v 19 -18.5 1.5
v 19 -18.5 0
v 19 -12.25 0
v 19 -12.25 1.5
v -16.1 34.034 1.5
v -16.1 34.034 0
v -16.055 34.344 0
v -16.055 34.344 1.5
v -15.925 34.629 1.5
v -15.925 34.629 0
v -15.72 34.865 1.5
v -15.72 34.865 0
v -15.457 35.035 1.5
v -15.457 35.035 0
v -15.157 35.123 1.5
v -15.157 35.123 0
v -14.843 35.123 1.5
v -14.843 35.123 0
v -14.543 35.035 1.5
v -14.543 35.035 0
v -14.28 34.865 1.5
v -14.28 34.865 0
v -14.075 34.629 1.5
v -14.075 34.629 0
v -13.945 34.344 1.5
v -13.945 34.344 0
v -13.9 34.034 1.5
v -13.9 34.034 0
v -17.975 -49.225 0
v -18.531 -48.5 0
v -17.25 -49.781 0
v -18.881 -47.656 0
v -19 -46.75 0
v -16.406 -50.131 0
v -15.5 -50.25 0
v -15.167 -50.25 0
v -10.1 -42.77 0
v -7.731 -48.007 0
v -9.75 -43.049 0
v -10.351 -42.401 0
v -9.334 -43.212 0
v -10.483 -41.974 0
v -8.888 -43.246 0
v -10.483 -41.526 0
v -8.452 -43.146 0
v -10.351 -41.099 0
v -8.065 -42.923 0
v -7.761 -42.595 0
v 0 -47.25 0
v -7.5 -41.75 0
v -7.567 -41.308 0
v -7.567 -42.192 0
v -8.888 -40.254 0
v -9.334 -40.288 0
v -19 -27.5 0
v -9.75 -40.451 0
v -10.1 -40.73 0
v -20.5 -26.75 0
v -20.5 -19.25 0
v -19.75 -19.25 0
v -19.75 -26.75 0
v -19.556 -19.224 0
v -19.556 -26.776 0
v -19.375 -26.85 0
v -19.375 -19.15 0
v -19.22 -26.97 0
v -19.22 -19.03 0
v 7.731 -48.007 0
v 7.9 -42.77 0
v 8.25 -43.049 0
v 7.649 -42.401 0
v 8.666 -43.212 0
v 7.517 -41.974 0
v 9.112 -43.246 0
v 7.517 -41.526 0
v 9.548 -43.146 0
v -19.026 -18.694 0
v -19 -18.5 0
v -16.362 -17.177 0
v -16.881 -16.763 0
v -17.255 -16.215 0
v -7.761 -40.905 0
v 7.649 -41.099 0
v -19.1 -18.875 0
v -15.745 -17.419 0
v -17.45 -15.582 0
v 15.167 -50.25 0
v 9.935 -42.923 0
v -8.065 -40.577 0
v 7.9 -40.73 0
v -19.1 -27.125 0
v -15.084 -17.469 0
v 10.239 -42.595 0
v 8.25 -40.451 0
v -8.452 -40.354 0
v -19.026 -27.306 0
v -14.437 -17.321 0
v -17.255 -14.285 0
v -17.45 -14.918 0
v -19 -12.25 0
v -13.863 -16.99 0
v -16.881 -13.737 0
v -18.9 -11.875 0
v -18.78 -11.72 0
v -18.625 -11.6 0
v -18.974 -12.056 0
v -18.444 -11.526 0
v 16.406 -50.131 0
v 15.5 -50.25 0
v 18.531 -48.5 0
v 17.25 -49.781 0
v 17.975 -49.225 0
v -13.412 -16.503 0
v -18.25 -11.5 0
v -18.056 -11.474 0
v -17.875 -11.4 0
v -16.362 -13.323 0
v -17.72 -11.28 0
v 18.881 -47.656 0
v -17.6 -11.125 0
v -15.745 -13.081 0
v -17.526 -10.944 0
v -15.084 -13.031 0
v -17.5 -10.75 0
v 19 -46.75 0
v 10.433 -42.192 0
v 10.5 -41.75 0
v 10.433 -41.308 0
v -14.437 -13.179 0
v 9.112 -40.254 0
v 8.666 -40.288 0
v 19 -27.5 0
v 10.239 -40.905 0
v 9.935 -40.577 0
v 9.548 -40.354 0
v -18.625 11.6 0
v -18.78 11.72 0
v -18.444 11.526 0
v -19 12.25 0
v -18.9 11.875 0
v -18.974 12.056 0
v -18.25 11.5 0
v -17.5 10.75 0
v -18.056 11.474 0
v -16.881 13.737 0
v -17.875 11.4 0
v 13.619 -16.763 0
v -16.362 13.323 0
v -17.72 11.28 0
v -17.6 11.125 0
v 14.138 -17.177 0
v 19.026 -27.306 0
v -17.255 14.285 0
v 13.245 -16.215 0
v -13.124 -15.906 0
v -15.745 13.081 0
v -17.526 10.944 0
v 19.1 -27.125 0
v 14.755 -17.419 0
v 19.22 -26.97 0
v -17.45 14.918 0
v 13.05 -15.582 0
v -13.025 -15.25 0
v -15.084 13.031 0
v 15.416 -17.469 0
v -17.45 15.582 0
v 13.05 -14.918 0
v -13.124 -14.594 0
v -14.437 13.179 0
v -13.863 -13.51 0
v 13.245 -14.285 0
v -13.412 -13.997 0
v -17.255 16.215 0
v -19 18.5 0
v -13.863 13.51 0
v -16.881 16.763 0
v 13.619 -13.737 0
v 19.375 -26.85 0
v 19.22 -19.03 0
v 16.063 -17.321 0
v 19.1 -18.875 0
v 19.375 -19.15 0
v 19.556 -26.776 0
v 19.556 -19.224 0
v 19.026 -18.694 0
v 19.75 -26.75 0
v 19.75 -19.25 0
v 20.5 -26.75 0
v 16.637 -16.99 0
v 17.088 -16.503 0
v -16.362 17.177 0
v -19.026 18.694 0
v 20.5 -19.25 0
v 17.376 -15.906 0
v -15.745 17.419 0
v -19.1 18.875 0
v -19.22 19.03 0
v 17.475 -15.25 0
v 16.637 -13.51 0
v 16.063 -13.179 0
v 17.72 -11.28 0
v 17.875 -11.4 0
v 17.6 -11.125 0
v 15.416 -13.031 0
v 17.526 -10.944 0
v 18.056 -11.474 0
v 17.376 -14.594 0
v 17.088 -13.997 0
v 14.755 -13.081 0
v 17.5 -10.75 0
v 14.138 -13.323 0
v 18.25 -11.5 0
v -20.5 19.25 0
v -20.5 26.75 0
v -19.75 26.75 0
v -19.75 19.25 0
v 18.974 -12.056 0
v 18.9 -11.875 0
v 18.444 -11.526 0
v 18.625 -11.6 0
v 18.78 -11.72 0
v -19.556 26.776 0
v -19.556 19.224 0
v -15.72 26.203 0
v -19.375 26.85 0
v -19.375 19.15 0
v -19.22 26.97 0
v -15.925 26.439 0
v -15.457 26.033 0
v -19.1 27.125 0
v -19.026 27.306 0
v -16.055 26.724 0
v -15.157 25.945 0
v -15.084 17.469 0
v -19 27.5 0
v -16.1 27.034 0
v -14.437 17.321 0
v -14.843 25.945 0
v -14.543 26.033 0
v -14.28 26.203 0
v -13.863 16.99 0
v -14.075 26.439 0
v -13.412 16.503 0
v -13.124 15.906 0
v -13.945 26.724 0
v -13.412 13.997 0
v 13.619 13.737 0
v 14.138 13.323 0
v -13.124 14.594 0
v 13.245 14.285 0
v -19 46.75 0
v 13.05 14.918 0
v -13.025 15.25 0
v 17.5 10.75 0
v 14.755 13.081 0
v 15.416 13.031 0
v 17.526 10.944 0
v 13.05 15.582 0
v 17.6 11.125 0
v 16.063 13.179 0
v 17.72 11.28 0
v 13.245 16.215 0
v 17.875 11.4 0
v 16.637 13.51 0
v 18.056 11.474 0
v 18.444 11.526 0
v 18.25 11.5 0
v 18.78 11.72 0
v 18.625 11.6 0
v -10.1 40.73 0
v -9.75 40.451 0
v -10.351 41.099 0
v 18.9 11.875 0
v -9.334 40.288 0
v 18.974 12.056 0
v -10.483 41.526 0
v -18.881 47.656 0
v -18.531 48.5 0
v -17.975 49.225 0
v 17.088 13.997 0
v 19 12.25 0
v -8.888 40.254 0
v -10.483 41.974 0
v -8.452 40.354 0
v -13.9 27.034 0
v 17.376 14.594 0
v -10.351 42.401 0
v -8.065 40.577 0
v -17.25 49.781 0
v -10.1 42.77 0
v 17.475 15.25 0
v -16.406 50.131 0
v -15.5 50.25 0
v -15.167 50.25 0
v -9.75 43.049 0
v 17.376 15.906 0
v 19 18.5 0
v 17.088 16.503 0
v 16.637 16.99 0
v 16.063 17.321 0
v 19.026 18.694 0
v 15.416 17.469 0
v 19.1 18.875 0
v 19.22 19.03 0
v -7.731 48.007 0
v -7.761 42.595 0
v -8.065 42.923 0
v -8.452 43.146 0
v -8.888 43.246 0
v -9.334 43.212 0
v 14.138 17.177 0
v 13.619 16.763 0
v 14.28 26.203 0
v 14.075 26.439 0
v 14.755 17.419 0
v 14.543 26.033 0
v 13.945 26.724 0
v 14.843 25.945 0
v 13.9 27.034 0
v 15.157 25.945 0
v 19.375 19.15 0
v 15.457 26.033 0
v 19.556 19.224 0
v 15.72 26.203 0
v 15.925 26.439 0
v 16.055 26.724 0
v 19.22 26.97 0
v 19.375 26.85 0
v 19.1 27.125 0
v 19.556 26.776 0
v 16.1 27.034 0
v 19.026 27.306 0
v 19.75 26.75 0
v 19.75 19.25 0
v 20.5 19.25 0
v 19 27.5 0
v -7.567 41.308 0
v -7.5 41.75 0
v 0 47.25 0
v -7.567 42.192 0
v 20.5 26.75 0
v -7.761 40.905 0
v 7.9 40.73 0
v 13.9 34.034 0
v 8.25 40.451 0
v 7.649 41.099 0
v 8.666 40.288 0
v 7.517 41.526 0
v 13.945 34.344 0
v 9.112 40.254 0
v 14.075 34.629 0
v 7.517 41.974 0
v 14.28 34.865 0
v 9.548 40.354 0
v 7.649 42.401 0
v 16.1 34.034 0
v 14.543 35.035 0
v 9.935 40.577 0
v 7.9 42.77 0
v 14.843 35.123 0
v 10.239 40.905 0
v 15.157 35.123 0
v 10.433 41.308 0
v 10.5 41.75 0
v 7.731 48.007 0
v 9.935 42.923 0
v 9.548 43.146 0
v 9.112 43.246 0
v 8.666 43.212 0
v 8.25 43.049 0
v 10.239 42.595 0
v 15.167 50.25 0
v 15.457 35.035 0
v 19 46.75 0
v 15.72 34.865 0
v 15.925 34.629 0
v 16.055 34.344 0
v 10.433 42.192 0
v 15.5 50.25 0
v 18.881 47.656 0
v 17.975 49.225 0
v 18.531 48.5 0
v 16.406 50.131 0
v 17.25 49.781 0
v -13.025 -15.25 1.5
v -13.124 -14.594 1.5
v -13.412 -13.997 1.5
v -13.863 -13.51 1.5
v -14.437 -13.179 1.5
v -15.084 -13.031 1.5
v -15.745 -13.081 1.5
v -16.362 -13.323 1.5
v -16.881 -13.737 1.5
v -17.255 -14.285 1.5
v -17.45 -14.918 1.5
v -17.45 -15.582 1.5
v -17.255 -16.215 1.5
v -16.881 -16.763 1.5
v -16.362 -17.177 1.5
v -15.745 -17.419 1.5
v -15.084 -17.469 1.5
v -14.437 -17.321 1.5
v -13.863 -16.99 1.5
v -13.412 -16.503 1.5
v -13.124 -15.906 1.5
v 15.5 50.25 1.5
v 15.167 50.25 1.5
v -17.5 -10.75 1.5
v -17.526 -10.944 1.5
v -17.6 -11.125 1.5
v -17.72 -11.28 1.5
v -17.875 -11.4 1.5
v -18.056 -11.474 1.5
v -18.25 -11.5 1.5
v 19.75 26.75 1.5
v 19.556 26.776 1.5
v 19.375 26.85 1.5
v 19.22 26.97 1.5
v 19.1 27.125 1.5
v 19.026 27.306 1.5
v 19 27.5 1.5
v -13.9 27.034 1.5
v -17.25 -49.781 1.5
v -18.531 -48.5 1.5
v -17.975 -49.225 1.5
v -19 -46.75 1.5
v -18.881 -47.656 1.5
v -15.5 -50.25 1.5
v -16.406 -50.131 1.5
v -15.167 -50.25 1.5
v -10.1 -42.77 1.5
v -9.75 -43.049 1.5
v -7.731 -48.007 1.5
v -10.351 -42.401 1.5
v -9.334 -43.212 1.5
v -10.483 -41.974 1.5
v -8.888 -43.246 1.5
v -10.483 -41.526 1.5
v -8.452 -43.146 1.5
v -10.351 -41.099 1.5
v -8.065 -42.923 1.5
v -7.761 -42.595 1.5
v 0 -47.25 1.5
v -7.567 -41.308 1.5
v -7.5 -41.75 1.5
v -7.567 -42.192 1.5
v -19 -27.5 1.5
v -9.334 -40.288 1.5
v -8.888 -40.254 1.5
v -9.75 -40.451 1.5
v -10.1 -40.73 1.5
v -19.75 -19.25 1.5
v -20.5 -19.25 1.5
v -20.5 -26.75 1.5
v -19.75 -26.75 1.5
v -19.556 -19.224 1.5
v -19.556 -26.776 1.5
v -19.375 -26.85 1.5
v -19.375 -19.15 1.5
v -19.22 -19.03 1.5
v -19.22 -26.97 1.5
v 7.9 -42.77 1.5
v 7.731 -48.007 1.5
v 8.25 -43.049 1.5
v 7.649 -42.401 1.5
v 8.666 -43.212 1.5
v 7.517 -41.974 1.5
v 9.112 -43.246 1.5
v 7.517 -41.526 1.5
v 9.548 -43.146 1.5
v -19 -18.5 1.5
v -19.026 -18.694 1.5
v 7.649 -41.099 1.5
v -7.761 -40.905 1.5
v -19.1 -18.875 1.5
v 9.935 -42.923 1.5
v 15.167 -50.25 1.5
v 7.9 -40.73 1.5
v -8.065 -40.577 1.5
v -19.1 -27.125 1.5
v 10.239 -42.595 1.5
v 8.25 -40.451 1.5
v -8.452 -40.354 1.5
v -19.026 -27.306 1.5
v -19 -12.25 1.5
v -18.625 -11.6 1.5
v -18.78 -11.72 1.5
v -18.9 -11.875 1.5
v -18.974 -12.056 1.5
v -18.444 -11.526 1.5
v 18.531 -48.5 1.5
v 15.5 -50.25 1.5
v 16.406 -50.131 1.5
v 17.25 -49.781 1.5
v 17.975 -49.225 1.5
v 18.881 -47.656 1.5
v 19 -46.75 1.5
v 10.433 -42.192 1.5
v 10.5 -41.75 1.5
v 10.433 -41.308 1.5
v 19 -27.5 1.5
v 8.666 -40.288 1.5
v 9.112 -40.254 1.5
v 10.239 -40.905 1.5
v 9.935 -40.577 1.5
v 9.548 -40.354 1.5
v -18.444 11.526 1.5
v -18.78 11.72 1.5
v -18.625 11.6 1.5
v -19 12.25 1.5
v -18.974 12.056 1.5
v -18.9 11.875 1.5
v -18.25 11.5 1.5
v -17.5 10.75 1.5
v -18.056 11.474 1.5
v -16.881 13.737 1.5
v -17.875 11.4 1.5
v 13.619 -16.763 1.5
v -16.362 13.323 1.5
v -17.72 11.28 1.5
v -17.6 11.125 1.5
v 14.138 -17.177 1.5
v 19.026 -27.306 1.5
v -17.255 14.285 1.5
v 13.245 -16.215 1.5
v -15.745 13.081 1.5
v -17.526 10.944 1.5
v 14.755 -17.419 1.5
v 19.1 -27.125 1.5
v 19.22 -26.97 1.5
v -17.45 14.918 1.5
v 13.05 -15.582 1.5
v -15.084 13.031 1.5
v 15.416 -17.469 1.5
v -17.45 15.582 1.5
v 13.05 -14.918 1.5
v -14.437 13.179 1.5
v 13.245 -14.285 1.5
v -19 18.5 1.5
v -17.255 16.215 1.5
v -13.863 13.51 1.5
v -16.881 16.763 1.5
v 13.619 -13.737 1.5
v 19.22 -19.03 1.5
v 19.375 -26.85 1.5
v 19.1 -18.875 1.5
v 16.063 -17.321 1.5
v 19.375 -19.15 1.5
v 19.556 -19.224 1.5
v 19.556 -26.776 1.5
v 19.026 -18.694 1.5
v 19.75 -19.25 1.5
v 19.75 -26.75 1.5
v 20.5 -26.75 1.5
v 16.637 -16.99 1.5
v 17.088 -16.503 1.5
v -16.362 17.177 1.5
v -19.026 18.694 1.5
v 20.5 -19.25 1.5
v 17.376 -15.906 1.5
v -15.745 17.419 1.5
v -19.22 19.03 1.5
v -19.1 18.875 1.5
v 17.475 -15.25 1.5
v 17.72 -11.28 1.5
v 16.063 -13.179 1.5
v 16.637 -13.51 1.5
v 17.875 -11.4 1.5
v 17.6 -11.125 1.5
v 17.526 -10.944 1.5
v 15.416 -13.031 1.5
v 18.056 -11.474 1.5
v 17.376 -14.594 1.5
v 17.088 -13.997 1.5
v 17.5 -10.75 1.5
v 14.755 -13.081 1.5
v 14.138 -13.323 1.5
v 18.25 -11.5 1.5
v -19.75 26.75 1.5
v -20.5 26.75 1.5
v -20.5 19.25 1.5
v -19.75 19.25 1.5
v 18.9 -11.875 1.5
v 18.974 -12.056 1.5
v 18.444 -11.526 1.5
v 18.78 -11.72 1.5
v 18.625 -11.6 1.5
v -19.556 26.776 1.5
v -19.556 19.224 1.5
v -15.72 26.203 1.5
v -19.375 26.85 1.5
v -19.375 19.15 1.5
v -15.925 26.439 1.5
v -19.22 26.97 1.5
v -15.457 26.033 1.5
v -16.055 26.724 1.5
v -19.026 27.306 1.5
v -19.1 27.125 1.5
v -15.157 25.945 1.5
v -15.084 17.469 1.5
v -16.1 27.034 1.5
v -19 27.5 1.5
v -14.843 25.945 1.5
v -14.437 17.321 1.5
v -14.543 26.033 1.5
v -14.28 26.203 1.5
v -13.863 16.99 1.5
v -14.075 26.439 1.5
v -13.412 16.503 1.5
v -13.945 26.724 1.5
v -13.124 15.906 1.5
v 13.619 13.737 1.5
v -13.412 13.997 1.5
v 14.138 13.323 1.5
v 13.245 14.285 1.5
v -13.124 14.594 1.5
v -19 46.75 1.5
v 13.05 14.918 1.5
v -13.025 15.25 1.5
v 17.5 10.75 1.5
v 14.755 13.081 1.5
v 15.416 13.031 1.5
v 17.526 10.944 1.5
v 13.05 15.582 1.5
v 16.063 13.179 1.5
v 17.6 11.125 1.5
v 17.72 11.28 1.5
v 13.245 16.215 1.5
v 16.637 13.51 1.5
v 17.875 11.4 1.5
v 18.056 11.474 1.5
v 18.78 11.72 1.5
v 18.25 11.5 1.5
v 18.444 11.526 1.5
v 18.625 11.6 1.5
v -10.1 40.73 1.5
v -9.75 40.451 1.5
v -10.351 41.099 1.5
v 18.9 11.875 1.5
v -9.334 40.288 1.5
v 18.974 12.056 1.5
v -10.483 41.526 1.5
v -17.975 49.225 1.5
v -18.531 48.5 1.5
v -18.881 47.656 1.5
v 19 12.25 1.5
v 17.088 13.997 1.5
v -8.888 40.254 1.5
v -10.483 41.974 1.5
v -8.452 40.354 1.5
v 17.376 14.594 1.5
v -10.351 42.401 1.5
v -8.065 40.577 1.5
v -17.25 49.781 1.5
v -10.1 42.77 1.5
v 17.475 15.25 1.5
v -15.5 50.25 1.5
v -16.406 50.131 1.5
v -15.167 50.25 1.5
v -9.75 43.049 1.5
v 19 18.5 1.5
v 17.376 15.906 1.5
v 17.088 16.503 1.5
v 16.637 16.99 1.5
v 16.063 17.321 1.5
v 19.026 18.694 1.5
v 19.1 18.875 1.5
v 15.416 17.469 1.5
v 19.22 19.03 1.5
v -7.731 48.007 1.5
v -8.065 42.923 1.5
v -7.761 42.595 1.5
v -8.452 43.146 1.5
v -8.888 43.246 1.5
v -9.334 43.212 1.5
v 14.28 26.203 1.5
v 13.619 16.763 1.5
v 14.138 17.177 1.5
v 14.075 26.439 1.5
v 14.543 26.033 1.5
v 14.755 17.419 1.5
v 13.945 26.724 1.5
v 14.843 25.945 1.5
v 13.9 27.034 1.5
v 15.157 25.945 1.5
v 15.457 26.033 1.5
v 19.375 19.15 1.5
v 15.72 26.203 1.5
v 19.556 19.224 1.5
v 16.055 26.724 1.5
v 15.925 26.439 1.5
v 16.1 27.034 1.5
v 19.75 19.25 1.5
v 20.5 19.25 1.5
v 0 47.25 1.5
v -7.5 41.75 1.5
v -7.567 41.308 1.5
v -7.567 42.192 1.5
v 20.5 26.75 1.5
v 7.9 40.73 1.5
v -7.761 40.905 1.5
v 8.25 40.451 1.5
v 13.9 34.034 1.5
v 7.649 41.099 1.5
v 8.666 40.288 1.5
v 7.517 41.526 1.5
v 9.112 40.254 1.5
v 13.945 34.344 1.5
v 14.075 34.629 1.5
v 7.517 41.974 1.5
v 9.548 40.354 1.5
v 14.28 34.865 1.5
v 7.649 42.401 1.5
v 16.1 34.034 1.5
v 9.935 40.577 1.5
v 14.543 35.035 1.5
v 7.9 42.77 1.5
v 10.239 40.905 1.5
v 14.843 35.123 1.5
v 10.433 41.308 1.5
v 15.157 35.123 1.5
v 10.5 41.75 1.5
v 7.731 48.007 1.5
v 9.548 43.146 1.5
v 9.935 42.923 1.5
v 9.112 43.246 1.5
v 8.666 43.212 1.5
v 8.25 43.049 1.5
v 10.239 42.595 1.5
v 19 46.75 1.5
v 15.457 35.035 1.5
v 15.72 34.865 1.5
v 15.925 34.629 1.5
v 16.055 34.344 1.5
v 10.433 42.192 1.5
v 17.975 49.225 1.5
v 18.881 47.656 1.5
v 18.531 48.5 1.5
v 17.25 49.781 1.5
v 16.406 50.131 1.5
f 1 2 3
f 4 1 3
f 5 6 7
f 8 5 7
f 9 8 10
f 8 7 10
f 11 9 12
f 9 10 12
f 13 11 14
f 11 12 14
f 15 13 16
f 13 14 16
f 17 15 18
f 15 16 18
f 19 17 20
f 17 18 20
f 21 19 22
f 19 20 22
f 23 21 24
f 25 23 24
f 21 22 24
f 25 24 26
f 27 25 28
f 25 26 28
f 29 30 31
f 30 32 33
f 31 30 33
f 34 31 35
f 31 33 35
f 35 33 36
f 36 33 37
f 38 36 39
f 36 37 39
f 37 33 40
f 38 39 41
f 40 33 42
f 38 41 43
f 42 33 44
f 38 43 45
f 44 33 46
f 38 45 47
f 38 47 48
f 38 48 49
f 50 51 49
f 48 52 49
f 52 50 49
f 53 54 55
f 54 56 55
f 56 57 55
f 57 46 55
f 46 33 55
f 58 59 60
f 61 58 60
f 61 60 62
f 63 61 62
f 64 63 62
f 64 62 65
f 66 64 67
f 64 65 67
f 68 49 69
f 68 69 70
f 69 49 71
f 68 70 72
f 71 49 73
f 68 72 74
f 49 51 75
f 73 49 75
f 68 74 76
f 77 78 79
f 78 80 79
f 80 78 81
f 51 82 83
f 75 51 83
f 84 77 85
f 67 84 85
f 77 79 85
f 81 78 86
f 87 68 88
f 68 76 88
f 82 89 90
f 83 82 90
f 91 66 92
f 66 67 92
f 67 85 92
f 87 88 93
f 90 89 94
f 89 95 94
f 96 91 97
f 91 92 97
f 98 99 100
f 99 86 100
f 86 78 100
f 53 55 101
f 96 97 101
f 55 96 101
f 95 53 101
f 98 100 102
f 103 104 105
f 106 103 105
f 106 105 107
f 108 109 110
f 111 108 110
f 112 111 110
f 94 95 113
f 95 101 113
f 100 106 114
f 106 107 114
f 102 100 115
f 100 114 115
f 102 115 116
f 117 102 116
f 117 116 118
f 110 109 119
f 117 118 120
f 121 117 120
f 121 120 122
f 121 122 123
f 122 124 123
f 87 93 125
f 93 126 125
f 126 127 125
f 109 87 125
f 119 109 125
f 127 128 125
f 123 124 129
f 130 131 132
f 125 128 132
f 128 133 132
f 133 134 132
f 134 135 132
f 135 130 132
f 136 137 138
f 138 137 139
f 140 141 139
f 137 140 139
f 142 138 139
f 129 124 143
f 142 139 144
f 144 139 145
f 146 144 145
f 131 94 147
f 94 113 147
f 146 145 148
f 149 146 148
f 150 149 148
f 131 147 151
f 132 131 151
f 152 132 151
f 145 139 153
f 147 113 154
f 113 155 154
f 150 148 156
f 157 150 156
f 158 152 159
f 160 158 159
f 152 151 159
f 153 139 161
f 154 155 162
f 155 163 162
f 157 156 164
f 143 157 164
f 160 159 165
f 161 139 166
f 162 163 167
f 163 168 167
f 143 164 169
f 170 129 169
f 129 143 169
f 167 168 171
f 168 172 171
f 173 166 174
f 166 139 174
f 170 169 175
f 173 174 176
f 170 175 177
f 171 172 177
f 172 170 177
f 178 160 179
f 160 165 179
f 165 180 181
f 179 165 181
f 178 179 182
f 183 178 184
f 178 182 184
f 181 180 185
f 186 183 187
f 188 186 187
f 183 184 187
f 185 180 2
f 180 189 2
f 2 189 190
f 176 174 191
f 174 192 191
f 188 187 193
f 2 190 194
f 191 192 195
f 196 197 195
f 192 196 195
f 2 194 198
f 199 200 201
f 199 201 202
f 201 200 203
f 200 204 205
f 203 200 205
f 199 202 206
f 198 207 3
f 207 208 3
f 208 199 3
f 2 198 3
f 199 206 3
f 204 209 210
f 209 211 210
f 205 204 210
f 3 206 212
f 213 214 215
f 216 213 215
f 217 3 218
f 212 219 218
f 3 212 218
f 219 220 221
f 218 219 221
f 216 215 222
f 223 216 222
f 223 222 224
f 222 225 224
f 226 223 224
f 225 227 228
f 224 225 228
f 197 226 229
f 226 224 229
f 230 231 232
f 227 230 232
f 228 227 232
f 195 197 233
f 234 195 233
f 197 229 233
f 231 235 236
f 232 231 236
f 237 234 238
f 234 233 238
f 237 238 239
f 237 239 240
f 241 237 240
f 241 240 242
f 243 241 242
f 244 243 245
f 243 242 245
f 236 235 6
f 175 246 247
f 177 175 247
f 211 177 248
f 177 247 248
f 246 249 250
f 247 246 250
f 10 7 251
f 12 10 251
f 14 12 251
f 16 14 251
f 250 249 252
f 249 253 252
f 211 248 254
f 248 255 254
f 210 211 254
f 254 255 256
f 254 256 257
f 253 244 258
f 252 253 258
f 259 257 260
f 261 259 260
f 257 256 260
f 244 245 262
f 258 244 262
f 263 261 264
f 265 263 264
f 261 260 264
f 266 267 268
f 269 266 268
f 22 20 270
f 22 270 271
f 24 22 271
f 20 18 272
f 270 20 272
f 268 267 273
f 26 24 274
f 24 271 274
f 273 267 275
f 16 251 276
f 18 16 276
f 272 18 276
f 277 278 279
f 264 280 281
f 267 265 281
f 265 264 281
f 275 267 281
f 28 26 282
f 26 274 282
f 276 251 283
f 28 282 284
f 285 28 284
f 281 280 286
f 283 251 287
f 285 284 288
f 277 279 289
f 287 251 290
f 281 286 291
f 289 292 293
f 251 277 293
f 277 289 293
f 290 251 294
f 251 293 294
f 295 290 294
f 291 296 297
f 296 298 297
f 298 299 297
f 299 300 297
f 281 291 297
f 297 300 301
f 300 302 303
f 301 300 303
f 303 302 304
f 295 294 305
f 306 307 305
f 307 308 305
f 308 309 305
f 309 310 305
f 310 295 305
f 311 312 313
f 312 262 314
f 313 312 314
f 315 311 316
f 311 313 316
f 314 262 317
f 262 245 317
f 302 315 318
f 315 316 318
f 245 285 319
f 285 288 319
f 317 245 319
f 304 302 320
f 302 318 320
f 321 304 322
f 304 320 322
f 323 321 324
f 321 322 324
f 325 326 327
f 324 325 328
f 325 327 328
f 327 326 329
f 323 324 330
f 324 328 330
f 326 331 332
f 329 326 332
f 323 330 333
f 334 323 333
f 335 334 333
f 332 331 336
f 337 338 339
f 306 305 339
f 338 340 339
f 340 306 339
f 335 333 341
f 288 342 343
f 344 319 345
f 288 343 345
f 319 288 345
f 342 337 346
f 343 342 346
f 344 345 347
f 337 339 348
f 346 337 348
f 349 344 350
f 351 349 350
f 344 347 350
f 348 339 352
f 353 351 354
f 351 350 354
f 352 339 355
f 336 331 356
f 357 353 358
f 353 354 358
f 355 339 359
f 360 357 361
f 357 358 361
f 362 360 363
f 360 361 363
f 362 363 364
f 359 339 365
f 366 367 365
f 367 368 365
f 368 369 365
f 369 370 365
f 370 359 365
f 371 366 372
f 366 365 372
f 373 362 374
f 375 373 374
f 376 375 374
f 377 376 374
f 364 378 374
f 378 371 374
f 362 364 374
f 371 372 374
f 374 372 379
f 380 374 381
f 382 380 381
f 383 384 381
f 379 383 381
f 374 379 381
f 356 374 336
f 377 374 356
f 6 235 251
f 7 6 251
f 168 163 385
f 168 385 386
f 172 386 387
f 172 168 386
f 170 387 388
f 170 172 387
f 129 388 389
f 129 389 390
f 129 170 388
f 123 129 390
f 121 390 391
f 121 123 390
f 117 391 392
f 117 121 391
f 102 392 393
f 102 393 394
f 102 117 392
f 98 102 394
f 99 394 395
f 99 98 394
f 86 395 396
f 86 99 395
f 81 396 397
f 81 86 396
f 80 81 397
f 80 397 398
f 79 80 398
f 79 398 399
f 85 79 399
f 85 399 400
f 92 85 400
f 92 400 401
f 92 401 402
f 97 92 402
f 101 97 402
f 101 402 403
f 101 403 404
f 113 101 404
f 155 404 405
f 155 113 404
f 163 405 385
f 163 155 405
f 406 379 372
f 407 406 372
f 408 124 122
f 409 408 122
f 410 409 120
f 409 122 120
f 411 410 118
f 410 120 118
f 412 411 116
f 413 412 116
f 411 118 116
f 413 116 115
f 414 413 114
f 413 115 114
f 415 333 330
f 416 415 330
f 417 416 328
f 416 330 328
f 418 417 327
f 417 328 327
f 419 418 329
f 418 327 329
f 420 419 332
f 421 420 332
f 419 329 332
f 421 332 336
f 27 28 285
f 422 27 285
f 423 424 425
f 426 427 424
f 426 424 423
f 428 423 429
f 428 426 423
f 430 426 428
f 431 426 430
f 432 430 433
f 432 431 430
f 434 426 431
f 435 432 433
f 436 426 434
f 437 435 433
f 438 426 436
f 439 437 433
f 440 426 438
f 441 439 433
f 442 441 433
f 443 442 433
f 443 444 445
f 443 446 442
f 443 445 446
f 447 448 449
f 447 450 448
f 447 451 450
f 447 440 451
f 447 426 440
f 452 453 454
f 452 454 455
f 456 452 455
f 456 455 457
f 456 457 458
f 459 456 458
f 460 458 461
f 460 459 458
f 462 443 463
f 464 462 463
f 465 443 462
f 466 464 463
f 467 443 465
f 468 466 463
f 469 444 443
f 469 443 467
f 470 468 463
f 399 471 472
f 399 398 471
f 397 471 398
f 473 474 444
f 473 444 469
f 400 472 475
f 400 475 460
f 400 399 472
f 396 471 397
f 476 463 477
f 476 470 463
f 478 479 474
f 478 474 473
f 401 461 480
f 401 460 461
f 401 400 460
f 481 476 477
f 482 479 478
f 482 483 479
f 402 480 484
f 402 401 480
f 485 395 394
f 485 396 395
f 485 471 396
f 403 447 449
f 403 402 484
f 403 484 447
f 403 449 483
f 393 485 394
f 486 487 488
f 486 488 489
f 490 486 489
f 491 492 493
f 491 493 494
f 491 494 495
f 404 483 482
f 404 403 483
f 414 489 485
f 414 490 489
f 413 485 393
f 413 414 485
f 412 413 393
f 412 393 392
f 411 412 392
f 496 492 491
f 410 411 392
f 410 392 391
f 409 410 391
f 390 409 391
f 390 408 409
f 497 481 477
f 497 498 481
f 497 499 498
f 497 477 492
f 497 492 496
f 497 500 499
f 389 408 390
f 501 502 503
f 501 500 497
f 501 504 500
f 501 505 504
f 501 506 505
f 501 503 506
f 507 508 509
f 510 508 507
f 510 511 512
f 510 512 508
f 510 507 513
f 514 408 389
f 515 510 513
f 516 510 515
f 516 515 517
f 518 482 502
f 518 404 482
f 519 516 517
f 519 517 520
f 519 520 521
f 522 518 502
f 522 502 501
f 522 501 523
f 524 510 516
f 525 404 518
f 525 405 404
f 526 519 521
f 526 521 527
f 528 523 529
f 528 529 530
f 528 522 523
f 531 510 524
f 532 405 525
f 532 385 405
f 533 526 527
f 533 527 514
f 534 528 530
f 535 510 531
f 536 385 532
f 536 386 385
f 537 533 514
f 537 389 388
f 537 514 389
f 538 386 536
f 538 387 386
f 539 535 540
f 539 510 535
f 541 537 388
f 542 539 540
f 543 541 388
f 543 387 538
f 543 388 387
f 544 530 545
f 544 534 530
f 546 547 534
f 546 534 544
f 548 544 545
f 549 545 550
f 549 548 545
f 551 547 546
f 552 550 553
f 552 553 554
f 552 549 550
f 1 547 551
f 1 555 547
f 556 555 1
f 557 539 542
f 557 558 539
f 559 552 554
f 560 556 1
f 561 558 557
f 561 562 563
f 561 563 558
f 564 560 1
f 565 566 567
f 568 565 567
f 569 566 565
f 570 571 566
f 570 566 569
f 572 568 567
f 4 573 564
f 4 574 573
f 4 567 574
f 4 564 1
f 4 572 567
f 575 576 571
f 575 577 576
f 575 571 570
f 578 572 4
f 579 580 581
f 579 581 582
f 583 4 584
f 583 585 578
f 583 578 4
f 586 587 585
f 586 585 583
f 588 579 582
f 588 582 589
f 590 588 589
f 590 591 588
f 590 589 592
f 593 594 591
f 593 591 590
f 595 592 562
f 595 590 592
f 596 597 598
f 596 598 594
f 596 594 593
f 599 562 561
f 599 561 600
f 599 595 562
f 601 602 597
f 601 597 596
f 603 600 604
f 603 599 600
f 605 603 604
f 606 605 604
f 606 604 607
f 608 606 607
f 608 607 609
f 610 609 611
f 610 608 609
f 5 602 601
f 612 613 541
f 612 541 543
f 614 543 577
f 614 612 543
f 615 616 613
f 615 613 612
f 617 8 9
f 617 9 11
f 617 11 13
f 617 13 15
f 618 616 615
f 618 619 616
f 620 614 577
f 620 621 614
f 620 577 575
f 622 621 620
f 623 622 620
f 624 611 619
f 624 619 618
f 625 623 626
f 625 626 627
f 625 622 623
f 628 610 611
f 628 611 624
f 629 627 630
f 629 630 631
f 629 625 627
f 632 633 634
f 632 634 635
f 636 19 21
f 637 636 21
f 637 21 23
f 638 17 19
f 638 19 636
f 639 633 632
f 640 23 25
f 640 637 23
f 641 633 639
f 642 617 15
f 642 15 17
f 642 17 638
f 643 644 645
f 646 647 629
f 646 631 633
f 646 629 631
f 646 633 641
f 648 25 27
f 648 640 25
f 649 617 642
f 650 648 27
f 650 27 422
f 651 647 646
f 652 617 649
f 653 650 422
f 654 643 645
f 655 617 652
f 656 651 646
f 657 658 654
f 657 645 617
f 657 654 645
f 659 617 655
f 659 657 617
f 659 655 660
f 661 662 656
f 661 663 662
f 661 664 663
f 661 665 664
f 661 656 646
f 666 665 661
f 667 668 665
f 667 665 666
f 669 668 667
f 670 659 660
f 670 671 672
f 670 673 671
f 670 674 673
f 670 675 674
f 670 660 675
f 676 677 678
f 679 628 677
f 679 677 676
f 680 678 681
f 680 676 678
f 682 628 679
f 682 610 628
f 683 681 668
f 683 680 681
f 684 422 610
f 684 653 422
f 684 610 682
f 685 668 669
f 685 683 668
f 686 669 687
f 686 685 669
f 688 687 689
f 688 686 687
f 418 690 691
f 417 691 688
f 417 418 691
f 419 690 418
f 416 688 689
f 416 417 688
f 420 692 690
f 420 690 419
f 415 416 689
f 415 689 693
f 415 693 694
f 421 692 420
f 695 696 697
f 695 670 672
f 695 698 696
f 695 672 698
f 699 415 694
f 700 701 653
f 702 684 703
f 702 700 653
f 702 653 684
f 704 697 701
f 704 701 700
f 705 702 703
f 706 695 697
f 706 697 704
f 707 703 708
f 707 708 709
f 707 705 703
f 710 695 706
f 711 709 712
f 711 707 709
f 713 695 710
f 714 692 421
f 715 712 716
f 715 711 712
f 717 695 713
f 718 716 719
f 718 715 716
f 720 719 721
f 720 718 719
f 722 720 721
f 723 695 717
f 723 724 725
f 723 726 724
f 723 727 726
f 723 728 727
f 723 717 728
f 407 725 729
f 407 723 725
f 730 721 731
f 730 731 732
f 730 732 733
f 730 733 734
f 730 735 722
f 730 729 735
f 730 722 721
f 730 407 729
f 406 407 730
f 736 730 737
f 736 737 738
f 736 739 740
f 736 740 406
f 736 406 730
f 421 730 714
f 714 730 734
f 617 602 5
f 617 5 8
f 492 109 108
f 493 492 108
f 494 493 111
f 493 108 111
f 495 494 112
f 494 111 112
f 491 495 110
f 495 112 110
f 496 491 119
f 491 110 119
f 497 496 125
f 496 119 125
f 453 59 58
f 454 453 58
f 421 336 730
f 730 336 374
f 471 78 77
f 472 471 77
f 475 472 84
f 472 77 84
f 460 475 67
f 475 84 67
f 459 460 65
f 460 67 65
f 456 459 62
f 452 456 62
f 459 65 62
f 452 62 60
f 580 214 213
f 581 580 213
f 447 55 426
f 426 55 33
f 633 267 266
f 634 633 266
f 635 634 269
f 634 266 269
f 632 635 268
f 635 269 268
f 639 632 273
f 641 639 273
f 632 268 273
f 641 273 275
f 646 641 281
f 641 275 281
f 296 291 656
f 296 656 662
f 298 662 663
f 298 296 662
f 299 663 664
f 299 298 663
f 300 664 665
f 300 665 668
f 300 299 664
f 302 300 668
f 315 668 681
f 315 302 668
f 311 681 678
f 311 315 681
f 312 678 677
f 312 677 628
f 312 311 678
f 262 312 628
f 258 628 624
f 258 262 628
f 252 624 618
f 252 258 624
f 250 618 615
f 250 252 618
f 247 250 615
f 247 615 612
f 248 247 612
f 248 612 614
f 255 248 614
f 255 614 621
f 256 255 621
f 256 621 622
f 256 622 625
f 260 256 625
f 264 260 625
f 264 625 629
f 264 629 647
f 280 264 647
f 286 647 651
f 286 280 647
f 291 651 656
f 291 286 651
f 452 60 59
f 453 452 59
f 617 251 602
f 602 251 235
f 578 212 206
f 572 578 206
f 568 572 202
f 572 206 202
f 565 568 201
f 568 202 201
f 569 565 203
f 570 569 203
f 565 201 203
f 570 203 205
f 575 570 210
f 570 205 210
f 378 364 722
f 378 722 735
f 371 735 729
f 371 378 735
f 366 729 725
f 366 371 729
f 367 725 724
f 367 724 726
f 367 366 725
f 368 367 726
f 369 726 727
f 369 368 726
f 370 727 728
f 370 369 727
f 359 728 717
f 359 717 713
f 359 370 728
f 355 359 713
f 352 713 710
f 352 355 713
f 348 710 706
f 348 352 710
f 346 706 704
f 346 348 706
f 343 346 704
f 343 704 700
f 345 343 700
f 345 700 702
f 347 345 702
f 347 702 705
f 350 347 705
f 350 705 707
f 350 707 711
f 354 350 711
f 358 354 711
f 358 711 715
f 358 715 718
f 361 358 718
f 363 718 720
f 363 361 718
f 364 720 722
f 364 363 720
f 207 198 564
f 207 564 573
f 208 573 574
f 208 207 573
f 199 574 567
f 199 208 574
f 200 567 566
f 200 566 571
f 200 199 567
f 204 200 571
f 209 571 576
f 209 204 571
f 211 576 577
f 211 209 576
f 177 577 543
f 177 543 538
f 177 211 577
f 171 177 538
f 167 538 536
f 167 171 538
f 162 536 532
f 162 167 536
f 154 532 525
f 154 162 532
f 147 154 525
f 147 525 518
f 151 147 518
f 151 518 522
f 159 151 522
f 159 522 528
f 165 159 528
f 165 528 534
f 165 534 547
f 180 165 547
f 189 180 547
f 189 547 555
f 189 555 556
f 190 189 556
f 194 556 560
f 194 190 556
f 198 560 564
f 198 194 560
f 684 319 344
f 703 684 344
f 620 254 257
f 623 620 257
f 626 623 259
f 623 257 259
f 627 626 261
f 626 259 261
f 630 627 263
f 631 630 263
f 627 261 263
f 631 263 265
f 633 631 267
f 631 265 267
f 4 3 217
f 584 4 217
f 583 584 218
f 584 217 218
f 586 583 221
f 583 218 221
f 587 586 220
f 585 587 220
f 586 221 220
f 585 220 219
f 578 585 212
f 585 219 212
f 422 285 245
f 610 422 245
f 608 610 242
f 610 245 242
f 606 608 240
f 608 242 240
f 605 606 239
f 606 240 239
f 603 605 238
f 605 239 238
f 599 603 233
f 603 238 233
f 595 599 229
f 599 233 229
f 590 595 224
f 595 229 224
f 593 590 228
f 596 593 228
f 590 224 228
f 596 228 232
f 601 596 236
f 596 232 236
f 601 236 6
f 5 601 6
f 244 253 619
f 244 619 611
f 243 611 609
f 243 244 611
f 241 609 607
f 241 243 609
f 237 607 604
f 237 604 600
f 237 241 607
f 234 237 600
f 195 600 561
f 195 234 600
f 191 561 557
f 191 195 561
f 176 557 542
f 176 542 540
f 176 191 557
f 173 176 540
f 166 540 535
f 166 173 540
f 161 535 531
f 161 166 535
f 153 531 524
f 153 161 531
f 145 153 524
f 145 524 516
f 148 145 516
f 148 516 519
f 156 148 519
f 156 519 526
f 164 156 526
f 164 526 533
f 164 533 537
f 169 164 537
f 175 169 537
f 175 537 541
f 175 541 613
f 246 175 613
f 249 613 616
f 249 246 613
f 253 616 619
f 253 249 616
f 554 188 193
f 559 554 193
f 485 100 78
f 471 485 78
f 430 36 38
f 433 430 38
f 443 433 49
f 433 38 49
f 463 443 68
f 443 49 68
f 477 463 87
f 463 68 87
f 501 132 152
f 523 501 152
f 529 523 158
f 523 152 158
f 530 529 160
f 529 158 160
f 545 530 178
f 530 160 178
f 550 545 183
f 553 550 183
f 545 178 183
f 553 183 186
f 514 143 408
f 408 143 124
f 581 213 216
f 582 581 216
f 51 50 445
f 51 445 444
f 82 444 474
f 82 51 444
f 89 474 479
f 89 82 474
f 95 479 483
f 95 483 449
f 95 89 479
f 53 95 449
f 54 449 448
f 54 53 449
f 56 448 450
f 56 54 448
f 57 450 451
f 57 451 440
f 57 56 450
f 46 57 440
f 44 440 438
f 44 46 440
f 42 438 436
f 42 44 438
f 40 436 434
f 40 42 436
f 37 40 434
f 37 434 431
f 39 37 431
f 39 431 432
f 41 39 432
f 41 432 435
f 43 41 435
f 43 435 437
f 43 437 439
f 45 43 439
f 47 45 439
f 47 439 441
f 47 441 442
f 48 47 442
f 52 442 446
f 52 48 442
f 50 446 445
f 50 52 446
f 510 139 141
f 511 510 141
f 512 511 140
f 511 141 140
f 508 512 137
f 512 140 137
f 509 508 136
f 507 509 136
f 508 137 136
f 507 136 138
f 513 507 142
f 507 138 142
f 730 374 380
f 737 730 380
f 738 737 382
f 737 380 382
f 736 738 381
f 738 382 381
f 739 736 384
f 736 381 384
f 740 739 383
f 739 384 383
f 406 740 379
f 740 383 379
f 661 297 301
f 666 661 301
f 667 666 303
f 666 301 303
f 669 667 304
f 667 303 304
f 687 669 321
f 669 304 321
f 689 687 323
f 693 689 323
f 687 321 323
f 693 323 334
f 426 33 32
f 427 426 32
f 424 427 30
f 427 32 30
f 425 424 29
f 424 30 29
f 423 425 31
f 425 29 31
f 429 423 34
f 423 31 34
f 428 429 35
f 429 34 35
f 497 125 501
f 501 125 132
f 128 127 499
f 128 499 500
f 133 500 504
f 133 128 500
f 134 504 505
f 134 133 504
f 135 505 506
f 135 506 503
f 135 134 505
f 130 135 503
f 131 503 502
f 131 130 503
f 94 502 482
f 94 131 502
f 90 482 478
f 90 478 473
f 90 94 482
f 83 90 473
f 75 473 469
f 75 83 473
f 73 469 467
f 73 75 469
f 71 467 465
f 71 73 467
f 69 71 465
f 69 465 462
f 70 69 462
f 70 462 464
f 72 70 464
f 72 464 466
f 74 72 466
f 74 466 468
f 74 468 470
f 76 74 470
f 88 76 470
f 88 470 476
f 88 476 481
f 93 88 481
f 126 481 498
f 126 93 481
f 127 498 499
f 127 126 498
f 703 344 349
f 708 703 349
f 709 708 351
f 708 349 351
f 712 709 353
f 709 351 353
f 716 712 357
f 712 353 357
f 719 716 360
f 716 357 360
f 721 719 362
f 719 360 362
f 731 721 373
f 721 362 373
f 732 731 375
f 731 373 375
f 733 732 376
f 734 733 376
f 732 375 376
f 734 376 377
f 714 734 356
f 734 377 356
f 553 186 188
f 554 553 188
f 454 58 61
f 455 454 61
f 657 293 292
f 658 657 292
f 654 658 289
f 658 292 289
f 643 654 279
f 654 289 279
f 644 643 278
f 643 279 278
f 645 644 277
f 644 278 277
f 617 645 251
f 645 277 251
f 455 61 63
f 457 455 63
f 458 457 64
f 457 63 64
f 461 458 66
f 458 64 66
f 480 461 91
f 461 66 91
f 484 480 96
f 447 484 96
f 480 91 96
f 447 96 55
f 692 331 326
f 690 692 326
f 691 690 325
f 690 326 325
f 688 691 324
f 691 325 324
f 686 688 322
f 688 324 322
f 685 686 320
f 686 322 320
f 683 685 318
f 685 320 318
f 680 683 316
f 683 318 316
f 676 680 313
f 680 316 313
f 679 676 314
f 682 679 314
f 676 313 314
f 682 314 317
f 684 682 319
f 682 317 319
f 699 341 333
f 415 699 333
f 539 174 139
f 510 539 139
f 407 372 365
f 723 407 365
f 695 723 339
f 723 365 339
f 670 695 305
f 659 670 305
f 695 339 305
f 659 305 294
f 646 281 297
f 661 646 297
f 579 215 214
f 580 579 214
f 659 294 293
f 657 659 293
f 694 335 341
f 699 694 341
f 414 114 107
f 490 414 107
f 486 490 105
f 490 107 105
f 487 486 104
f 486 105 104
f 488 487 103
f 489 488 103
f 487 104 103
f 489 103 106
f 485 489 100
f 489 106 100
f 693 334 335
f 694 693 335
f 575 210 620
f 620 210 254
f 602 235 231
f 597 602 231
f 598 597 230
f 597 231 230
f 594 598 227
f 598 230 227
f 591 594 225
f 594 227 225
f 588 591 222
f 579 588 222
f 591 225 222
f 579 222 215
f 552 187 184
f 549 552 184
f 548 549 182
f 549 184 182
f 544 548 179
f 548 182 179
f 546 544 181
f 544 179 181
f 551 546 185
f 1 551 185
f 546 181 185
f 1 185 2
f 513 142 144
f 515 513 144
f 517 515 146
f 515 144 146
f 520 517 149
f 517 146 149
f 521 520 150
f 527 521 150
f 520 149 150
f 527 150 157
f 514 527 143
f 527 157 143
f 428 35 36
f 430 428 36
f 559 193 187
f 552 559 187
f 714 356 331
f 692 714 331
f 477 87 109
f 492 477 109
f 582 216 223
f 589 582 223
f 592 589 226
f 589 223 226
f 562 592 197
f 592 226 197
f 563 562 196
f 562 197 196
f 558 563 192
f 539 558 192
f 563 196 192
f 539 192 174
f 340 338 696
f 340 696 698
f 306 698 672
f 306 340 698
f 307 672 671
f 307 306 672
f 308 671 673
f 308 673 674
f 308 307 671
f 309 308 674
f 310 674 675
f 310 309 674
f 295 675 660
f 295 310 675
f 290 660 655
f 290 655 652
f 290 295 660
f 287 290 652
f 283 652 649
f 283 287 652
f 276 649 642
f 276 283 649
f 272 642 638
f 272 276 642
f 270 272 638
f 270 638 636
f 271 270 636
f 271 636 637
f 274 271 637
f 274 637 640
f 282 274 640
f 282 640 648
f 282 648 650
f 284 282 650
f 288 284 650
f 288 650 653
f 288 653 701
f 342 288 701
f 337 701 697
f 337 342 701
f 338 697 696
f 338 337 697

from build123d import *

# Parameters (mm, degrees)
F0_R     = 1.5
F0_R_2   = 2.225
F1_DEPTH = 1.5


# Not quite as in the source:
# - ends of sketch curves that miss each other by under 0.0002 mm in the source are joined


with BuildPart() as f1:
    # F0 (on Top) → F1 (new body)
    with BuildSketch(Plane.XY):
        with BuildLine():
            ThreePointArc((19.75, -19.25), (19.2196699141, -19.0303300859), (19, -18.5))
            Line((19, -18.5), (19, -12.25))
            ThreePointArc((19, -12.25), (18.7803300859, -11.7196699141), (18.25, -11.5))
            ThreePointArc((18.25, -11.5), (17.7196699141, -11.2803300859), (17.5, -10.75))
            Line((17.5, -10.75), (17.5, 10.75))
            ThreePointArc((17.5, 10.75), (17.7196699141, 11.2803300859), (18.25, 11.5))
            ThreePointArc((18.25, 11.5), (18.7803300859, 11.7196699141), (19, 12.25))
            Line((19, 12.25), (19, 18.5))
            ThreePointArc((19, 18.5), (19.2196699141, 19.0303300859), (19.75, 19.25))
            Line((19.75, 19.25), (20.5, 19.25))
            Line((20.5, 19.25), (20.5, 26.75))
            Line((20.5, 26.75), (19.75, 26.75))
            ThreePointArc((19.75, 26.75), (19.2196699141, 26.9696699141), (19, 27.5))
            Line((19, 27.5), (19, 46.75))
            ThreePointArc((19, 46.75), (17.9748737342, 49.2248737342), (15.5, 50.25))
            Line((15.5, 50.25), (15.167259, 50.25))
            ThreePointArc((15.167259, 50.25), (0, 47.25), (-15.1672590116, 50.2499999718))
            Line((-15.1672590116, 50.2499999718), (-15.5, 50.25))
            ThreePointArc((-15.5, 50.25), (-17.9748737342, 49.2248737342), (-19, 46.75))
            Line((-19, 46.75), (-19, 27.5))
            ThreePointArc((-19, 27.5), (-19.2196699141, 26.9696699141), (-19.75, 26.75))
            Line((-19.75, 26.75), (-20.5, 26.75))
            Line((-20.5, 26.75), (-20.5, 19.25))
            Line((-20.5, 19.25), (-19.75, 19.25))
            ThreePointArc((-19.75, 19.25), (-19.2196699141, 19.0303300859), (-19, 18.5))
            Line((-19, 18.5), (-19, 12.25))
            ThreePointArc((-19, 12.25), (-18.7803300859, 11.7196699141), (-18.25, 11.5))
            ThreePointArc((-18.25, 11.5), (-17.7196699141, 11.2803300859), (-17.5, 10.75))
            Line((-17.5, 10.75), (-17.5, -10.75))
            ThreePointArc((-17.5, -10.75), (-17.7196699141, -11.2803300859), (-18.25, -11.5))
            ThreePointArc((-18.25, -11.5), (-18.7803300859, -11.7196699141), (-19, -12.25))
            Line((-19, -12.25), (-19, -18.5))
            ThreePointArc((-19, -18.5), (-19.2196699141, -19.0303300859), (-19.75, -19.25))
            Line((-19.75, -19.25), (-20.5, -19.25))
            Line((-20.5, -19.25), (-20.5, -26.75))
            Line((-20.5, -26.75), (-19.75, -26.75))
            ThreePointArc((-19.75, -26.75), (-19.2196699141, -26.9696699141), (-19, -27.5))
            Line((-19, -27.5), (-19, -46.75))
            ThreePointArc((-19, -46.75), (-17.9748737342, -49.2248737342), (-15.5, -50.25))
            Line((-15.5, -50.25), (-15.167259, -50.25))
            ThreePointArc((-15.167259, -50.25), (0, -47.249999), (15.1672593636, -50.2499991168))
            Line((15.1672593636, -50.2499991168), (15.5, -50.25))
            ThreePointArc((15.5, -50.25), (17.9748737342, -49.2248737342), (19, -46.75))
            Line((19, -46.75), (19, -27.5))
            ThreePointArc((19, -27.5), (19.2196699141, -26.9696699141), (19.75, -26.75))
            Line((19.75, -26.75), (20.5, -26.75))
            Line((20.5, -26.75), (20.5, -19.25))
            Line((20.5, -19.25), (19.75, -19.25))
        make_face()
        with Locations((-9, -41.75)):
            Circle(F0_R, mode=Mode.SUBTRACT)
        with Locations((-15.25, -15.25)):
            Circle(F0_R_2, mode=Mode.SUBTRACT)
        with Locations((9, -41.75)):
            Circle(F0_R, mode=Mode.SUBTRACT)
        with Locations((15.25, -15.25)):
            Circle(F0_R_2, mode=Mode.SUBTRACT)
        with Locations((-15.25, 15.25)):
            Circle(F0_R_2, mode=Mode.SUBTRACT)
        with BuildLine():
            ThreePointArc((-16.1, 34.033918), (-15, 35.133918), (-13.9, 34.033918))
            Line((-13.9, 34.033918), (-13.9, 27.033918))
            ThreePointArc((-13.9, 27.033918), (-15, 25.933918), (-16.1, 27.033918))
            Line((-16.1, 27.033918), (-16.1, 34.033918))
        make_face(mode=Mode.SUBTRACT)
        with Locations((-9, 41.75)):
            Circle(F0_R, mode=Mode.SUBTRACT)
        with Locations((15.25, 15.25)):
            Circle(F0_R_2, mode=Mode.SUBTRACT)
        with Locations((9, 41.75)):
            Circle(F0_R, mode=Mode.SUBTRACT)
        with BuildLine():
            ThreePointArc((13.9, 34.033918), (15, 35.133918), (16.1, 34.033918))
            Line((16.1, 34.033918), (16.1, 27.033918))
            ThreePointArc((16.1, 27.033918), (15, 25.933918), (13.9, 27.033918))
            Line((13.9, 27.033918), (13.9, 34.033918))
        make_face(mode=Mode.SUBTRACT)
    extrude(amount=F1_DEPTH)


solid = f1.part
